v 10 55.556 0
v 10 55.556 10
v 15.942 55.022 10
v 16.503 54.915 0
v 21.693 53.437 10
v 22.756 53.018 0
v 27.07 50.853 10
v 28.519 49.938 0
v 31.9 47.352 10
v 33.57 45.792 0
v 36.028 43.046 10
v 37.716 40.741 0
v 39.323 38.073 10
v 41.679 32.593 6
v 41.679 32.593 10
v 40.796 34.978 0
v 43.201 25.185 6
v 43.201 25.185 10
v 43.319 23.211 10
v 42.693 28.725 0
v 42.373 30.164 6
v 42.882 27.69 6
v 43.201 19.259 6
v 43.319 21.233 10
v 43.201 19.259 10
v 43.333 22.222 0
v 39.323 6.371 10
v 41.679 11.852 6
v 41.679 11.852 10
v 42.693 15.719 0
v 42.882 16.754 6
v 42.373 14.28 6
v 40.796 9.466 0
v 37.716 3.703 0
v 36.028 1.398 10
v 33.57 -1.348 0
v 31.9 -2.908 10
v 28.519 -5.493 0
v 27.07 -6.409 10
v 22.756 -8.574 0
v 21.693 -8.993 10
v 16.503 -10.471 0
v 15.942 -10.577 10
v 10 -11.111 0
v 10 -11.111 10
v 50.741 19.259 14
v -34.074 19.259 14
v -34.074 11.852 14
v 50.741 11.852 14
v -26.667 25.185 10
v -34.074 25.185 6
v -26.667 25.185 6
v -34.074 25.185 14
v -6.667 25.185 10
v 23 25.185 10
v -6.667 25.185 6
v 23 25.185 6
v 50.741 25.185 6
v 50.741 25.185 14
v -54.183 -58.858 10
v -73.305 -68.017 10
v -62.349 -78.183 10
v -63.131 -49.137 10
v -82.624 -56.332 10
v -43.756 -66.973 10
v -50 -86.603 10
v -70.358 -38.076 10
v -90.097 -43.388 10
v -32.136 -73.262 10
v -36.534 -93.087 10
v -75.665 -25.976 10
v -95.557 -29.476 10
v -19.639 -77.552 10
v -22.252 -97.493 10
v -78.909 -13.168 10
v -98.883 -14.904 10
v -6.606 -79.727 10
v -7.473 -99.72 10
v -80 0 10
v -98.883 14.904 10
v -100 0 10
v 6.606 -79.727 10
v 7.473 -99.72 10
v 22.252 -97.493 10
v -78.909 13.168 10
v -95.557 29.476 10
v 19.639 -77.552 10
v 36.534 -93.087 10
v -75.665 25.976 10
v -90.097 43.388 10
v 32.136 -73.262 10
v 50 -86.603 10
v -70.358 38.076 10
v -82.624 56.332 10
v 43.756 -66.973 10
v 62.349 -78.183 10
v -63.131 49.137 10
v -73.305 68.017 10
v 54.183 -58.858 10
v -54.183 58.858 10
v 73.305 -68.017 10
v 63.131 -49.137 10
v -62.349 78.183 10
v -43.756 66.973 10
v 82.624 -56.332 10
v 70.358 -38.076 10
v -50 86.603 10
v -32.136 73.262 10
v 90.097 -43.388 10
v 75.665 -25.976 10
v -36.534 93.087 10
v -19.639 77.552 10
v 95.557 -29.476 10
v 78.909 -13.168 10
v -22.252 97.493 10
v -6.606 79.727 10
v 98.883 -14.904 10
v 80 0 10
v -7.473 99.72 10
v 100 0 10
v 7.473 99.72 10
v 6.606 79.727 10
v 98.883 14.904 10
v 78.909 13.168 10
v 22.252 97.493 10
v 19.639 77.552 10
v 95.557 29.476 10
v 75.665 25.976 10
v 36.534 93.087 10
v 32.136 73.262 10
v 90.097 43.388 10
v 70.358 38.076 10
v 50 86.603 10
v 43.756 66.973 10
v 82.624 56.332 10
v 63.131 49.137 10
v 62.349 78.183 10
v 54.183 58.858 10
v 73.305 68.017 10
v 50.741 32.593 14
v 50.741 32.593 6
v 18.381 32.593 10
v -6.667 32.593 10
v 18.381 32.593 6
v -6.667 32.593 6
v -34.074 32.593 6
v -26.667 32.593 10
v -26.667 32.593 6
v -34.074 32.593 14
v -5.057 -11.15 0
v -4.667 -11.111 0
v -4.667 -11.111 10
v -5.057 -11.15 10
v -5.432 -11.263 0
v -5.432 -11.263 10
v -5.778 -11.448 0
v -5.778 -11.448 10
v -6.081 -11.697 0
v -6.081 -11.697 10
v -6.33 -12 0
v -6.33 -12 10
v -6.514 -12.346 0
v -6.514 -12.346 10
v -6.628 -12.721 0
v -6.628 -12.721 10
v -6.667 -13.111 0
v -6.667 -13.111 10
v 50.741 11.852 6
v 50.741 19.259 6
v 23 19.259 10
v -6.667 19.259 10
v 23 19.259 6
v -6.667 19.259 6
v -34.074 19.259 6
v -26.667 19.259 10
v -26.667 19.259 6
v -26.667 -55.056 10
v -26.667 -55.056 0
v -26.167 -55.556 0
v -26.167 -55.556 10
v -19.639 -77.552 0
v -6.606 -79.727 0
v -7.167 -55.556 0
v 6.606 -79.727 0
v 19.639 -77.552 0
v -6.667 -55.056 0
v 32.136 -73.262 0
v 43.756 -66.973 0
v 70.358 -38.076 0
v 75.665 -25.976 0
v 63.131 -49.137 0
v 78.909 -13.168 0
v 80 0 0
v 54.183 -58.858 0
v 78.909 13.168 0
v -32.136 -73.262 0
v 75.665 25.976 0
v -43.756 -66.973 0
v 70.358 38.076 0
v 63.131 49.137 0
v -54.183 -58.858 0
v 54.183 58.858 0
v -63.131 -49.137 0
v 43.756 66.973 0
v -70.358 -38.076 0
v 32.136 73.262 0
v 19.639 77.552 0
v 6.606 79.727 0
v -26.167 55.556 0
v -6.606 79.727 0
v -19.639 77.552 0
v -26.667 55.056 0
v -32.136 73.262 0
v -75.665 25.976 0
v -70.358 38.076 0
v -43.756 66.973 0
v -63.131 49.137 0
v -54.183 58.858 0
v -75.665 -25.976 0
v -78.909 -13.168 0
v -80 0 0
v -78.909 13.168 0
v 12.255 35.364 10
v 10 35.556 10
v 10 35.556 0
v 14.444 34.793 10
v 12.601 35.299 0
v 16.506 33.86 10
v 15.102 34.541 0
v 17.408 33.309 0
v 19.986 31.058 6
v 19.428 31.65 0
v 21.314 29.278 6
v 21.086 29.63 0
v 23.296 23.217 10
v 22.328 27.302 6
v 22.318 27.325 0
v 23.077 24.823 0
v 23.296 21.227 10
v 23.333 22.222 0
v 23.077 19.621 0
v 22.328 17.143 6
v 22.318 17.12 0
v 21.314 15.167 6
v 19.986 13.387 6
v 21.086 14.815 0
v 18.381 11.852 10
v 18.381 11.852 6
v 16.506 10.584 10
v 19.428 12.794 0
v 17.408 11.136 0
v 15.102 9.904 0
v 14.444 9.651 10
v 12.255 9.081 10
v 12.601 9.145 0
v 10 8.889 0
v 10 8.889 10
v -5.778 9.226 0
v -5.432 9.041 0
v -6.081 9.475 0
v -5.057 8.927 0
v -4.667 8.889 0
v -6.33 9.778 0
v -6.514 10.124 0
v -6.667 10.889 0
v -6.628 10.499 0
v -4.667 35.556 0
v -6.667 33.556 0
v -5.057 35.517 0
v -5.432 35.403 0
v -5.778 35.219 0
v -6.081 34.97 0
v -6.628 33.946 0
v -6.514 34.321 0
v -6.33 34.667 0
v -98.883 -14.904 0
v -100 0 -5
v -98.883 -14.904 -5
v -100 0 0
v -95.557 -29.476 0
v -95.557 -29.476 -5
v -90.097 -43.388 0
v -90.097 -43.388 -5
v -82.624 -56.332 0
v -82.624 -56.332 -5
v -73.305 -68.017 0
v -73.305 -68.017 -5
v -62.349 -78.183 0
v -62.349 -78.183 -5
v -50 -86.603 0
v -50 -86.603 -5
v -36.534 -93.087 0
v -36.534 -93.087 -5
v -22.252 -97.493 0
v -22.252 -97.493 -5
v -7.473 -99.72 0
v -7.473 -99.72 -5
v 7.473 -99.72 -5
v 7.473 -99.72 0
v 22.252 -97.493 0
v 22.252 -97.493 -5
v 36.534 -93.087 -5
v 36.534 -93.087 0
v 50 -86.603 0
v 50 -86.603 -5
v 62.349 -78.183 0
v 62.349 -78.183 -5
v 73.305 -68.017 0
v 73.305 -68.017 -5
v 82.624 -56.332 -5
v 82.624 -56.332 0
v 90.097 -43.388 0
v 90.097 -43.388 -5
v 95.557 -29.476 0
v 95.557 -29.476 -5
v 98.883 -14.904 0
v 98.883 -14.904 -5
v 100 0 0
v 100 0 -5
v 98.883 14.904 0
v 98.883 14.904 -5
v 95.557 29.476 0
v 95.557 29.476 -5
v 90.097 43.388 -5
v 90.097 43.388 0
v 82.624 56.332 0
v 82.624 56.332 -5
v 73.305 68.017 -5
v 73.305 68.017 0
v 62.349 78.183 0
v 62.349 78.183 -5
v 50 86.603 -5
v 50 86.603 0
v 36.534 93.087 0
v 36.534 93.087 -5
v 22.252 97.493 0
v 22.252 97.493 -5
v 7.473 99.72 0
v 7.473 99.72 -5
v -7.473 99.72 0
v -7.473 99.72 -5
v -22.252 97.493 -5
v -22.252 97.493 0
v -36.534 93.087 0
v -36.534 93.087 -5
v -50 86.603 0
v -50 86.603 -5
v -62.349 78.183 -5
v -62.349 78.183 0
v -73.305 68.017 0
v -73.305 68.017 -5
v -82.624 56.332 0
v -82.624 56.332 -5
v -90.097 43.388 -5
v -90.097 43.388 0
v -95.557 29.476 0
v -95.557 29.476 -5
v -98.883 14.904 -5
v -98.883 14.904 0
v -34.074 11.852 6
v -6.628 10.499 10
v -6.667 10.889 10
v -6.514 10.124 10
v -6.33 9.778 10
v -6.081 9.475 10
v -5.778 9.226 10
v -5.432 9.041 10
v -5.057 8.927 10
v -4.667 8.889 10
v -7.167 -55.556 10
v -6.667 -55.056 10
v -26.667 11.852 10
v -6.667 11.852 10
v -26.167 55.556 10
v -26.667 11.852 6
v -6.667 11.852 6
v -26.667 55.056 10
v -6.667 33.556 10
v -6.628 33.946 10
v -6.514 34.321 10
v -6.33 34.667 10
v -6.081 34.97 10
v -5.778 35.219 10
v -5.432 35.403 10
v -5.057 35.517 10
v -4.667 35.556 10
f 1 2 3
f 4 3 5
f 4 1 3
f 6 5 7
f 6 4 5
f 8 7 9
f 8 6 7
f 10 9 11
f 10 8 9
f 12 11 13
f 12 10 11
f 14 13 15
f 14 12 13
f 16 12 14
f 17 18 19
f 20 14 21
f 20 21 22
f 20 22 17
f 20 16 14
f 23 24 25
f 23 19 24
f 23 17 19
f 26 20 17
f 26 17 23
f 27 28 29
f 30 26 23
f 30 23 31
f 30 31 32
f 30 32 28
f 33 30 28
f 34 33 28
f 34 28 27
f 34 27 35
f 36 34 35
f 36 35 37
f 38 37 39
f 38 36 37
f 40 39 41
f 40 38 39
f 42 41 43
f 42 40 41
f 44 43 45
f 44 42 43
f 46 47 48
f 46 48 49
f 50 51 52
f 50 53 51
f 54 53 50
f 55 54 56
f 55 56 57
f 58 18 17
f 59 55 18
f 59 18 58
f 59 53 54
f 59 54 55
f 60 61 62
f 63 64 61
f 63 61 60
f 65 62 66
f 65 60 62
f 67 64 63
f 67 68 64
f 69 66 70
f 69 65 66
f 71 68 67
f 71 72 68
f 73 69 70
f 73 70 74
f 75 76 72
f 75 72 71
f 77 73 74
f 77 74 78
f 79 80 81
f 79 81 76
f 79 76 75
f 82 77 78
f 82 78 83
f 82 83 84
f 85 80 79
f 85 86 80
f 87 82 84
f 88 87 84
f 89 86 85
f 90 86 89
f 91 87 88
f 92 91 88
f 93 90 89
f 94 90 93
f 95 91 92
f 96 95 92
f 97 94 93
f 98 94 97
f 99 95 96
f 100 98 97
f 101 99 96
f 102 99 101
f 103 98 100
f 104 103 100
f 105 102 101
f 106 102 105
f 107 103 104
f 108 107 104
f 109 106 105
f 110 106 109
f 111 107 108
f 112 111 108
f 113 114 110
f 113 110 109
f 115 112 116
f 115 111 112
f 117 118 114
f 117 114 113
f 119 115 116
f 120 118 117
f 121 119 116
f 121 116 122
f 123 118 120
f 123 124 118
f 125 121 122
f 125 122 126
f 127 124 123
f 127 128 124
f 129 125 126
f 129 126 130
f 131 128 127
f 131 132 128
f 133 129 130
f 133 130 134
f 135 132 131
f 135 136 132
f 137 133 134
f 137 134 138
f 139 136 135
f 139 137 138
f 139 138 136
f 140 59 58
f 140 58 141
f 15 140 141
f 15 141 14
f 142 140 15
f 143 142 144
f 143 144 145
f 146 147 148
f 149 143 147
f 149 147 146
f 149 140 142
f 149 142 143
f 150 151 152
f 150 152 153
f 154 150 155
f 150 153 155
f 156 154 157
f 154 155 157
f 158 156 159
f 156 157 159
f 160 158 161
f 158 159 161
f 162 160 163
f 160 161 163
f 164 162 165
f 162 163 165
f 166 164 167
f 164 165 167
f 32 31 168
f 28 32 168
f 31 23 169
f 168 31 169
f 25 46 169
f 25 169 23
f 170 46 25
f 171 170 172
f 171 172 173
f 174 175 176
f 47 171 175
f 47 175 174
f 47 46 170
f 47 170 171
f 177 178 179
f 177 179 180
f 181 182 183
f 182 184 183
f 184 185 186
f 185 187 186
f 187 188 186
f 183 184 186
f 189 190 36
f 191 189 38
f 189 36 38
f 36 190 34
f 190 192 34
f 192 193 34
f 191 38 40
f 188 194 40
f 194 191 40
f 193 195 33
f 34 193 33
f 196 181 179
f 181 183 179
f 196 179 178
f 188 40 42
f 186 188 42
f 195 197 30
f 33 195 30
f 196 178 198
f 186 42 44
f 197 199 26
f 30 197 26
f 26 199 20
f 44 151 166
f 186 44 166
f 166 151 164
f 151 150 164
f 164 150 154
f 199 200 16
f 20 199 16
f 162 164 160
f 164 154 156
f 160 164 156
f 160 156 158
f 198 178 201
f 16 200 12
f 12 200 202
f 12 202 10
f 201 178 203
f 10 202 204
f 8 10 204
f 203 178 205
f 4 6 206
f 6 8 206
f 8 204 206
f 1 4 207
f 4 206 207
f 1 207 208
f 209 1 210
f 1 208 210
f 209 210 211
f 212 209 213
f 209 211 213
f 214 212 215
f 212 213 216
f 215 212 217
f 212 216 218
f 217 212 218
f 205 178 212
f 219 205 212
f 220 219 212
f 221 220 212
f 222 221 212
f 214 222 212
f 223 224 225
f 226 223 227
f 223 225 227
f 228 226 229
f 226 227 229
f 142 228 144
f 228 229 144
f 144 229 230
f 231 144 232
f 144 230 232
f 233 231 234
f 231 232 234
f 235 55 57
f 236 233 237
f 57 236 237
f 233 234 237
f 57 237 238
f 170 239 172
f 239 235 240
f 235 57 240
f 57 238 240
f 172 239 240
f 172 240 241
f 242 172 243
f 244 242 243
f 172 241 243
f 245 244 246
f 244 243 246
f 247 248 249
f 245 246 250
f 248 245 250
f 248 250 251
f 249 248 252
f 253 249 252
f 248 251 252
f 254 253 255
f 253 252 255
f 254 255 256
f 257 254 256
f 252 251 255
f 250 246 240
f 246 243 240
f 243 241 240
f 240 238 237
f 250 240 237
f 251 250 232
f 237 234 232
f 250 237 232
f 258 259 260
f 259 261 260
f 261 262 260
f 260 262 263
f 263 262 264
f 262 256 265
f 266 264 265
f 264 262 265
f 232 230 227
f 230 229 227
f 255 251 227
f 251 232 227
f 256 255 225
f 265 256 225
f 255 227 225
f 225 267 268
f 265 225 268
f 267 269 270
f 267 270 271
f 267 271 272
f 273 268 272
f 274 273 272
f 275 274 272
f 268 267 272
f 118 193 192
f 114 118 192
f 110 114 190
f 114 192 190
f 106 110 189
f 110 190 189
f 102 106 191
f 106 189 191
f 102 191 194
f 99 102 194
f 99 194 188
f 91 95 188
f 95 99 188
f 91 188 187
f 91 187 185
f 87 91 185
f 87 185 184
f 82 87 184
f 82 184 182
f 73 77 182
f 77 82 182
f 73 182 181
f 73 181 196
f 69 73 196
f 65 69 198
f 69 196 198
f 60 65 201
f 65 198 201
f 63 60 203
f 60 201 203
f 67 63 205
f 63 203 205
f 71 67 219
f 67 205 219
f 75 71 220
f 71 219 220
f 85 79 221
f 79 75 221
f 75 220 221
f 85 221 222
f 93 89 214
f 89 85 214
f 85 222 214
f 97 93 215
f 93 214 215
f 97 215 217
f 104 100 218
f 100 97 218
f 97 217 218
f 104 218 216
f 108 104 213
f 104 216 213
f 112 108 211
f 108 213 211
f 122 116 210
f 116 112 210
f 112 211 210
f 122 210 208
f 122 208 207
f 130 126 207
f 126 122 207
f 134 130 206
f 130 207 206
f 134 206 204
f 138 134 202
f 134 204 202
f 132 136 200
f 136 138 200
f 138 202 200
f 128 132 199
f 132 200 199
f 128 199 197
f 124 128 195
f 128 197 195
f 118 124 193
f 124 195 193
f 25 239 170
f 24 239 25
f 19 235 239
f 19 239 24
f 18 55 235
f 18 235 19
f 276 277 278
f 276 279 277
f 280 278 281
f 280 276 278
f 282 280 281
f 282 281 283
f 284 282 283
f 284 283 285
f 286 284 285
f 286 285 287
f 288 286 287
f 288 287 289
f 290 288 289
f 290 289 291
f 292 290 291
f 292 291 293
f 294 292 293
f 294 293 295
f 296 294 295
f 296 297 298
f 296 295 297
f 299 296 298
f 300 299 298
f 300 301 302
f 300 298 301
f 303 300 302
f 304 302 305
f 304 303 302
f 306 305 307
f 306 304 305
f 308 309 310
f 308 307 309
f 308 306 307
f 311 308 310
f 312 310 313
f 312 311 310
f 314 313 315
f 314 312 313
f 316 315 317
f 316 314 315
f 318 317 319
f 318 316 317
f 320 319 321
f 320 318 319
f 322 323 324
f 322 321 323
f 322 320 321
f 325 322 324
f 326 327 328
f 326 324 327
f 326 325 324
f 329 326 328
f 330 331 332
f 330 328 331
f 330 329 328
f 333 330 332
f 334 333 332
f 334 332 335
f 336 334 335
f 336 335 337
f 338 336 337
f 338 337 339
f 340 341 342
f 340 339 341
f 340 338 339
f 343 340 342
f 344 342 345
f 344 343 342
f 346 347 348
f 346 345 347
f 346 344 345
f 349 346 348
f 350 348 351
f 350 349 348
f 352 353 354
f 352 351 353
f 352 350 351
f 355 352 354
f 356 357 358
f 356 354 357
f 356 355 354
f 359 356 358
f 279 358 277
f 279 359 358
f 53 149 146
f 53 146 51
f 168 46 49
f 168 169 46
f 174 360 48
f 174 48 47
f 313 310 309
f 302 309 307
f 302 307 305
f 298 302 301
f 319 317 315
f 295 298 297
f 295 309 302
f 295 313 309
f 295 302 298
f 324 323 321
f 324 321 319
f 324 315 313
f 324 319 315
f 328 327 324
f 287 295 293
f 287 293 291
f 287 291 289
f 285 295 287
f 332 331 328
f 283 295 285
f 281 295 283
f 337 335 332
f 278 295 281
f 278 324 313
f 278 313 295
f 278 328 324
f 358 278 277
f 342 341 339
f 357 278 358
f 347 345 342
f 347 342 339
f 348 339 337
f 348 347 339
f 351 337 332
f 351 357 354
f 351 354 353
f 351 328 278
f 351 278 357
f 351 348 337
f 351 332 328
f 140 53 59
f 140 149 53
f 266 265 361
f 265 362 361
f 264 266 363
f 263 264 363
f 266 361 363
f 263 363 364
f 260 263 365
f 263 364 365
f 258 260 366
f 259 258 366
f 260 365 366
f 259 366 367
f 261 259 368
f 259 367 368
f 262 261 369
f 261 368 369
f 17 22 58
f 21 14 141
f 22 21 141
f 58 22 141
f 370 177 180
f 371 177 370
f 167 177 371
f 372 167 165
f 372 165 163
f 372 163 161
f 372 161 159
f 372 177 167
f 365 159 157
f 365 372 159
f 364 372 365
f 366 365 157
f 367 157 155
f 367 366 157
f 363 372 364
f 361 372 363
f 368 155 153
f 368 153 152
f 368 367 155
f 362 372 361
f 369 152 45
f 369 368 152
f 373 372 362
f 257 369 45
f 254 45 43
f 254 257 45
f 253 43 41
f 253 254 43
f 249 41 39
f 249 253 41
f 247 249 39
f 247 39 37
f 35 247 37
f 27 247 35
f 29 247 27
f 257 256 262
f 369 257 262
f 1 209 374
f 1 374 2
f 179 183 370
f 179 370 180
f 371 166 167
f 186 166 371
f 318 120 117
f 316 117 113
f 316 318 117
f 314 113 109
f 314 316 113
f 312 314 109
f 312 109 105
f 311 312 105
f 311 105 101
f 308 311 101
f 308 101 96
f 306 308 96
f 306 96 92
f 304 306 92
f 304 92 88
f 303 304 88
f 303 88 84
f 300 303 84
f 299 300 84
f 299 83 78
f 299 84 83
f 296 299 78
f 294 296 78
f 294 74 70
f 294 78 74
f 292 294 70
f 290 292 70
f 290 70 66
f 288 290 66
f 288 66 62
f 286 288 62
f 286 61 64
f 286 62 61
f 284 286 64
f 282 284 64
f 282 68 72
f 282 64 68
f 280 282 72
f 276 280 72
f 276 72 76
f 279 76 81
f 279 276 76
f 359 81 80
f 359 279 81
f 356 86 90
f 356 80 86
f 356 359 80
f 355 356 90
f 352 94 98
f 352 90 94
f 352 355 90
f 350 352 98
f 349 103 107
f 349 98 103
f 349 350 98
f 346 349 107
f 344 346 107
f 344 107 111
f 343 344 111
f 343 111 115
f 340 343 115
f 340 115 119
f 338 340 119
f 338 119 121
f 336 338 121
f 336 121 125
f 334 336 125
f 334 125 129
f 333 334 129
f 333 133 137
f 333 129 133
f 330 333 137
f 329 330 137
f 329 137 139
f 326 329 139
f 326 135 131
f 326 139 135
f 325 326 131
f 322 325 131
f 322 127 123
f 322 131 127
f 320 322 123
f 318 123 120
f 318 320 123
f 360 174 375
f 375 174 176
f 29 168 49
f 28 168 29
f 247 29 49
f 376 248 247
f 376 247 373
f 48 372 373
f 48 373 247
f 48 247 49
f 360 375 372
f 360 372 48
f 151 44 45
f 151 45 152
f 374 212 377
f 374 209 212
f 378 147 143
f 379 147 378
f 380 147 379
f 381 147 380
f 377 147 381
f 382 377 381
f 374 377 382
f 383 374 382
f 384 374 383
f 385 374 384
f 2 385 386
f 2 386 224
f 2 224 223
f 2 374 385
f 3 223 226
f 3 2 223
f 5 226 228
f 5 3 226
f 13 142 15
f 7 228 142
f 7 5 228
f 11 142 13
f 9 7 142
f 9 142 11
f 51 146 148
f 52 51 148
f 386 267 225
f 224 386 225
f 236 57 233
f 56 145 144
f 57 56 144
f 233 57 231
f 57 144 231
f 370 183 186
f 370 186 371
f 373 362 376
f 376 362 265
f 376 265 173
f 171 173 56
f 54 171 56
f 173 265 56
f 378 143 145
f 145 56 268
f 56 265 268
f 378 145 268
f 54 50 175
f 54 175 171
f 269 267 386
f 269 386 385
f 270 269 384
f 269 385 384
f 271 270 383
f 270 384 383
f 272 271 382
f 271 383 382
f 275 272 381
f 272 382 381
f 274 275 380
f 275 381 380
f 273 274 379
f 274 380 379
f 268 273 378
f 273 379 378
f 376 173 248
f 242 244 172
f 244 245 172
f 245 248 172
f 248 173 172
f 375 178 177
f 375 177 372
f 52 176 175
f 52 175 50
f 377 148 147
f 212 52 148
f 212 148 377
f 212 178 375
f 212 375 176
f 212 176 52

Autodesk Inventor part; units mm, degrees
ref_plane "YZ Plane" through (0, 0, 0) normal (1, 0, 0) x (0, 1, 0)
ref_plane "XZ Plane" through (0, 0, 0) normal (0, 1, 0) x (-1, 0, 0)
ref_plane "XY Plane" through (0, 0, 0) normal (0, 0, 1) x (1, 0, 0)
sketch "Sketch1" plane through (0, 0, 0) normal (0, 0, 1) x (1, 0, 0)
  circle A0 centre (0, 0) radius 100
  circle A1 centre (0, 0) radius 80
  line L0 (-26.6667, -55.5556) -> (-26.6667, 55.5556)
  line L1 (-26.6667, 55.5556) -> (10, 55.5556)
  arc A2 (10, -11.1111) -> (10, 55.5556) centre (10, 22.2222) ccw
  line L2 (10, -11.1111) -> (-6.6667, -11.1111)
  line L3 (-6.6667, -11.1111) -> (-6.6667, -55.5556)
  line L4 (-6.6667, -55.5556) -> (-26.6667, -55.5556)
  line L5 (-6.6667, 35.5556) -> (10, 35.5556)
  arc A3 (10, 8.8889) -> (10, 35.5556) centre (10, 22.2222) ccw
  line L6 (10, 8.8889) -> (-6.6667, 8.8889)
  line L7 (-6.6667, 8.8889) -> (-6.6667, 35.5556)
  line L8 (-34.0741, 11.8519) -> (50.7407, 11.8519)
  line L9 (50.7407, 11.8519) -> (50.7407, 19.2593)
  line L10 (50.7407, 19.2593) -> (-34.0741, 19.2593)
  line L11 (-34.0741, 19.2593) -> (-34.0741, 11.8519)
  line L12 (-34.0741, 25.1852) -> (50.7407, 25.1852)
  line L13 (50.7407, 25.1852) -> (50.7407, 32.5926)
  line L14 (50.7407, 32.5926) -> (-34.0741, 32.5926)
  line L15 (-34.0741, 32.5926) -> (-34.0741, 25.1852)
  line L16 (1.6667, 8.8889) -> (1.6667, 32.5926) construction
  line L17 (1.6667, 35.5556) -> (1.6667, 11.8519) construction
  line L18 (0, 80) -> (0, 55.5556) construction
  line L19 (0, -80) -> (0, -11.1111) construction
  line L20 (-26.6667, 0) -> (0, 0) construction
  line L21 (50.7407, 25.1852) -> (50.7407, 19.2593) construction
  line L22 (50.7407, 22.2222) -> (10, 22.2222) construction
  line L23 (43.3333, 22.2222) -> (50.7407, 22.2222) construction
  point P0 (0, -45.5556)
  dimension "d0" = 20
  dimension "d1" = 200
  dimension "d2" = 20
  dimension "d3" = 20
  dimension "d4" = 7.4074
  dimension "d5" = 111.1111
  dimension "d6" = 2.963
  dimension "d7" = 7.4074
  dimension "d12" = 7.4074
  dimension "d50" = 44.4444
  dimension "d52" = 10
  dimension "d53" = 30
extrude "Extrusion1" add sketch "Sketch1" along normal blind 10 contours A0 | L0 L8 L7 L6 A3 A2 L2 L3 L4 | L0 L10 L7 L8 | L0 L12 L7 L10 | L0 L14 L7 L12 | A3 L10 A2 L8 | L0 L1 A2 L14 A3 L5 L7 | A3 L12 A2 L10 | A3 L14 A2 L12
sketch "Sketch2" plane through (0, 0, 10) normal (0, 0, 1) x (1, 0, 0)
  line L0 (-34.0741, 25.1852) -> (50.7407, 25.1852) projected
  line L1 (50.7407, 32.5926) -> (-34.0741, 32.5926) projected
  line L2 (50.7407, 25.1852) -> (50.7407, 32.5926) projected
  line L3 (-34.0741, 32.5926) -> (-34.0741, 25.1852) projected
  line L4 (50.7407, 19.2593) -> (-34.0741, 19.2593) projected
  line L5 (-34.0741, 19.2593) -> (-34.0741, 11.8519) projected
  line L6 (-34.0741, 11.8519) -> (50.7407, 11.8519) projected
  line L7 (50.7407, 11.8519) -> (50.7407, 19.2593) projected
  point P0 (0, 0)
extrude "Extrusion2" add sketch "Sketch2" against normal blind 4
sketch "Sketch3" plane through (0, 0, 0) normal (0, 0, -1) x (-1, 0, 0)
  circle A0 centre (0, 0) radius 100 projected
extrude "Extrusion3" add sketch "Sketch3" along normal blind 5
fillet "Fillet2" radius 2 2 edges at (-6.6667, 8.8889, 5) (-6.6667, 35.5556, 5)
fillet "Fillet3" radius 2 1 edges at (-6.6667, -11.1111, 5)
chamfer "Chamfer1" distance 0.5 angle 45 3 edges at (-26.6667, 55.5556, 5) (-26.6667, -55.5556, 5) (-6.6667, -55.5556, 5)
sketch "Sketch6" plane through (0, 0, 10) normal (0, 0, 1) x (1, 0, 0)
  line L0 (50.7407, 32.5926) -> (-34.0741, 32.5926)
  line L1 (-34.0741, 32.5926) -> (-34.0741, 25.1852)
  line L2 (-34.0741, 25.1852) -> (50.7407, 25.1852)
  line L3 (50.7407, 25.1852) -> (50.7407, 32.5926)
  line L4 (-34.0741, 19.2593) -> (50.7407, 19.2593)
  line L5 (50.7407, 19.2593) -> (50.7407, 11.8519)
  line L6 (50.7407, 11.8519) -> (-34.0741, 11.8519)
  line L7 (-34.0741, 11.8519) -> (-34.0741, 19.2593)
  point P0 (0, 0)
extrude "Extrusion5" add sketch "Sketch6" along normal blind 4
equation "\"d0\" = 0.1 * d1"
equation "\"d2\" = d0"
equation "\"d3\" = d2"
equation "\"d4\" = 0.0666667 * d5"
equation "\"d5\" = 0.555556 * d1"
equation "\"d6\" = 0.4 * d4"
equation "\"d7\" = d4"
equation "\"d12\" = d4"
equation "\"d50\" = 0.4 * d5"
equation "\"d52\" = 0.5 * d0"
equation "\"d53\" = 3 * d52"
properties part number "PennyKoin-3D-Inventor"
